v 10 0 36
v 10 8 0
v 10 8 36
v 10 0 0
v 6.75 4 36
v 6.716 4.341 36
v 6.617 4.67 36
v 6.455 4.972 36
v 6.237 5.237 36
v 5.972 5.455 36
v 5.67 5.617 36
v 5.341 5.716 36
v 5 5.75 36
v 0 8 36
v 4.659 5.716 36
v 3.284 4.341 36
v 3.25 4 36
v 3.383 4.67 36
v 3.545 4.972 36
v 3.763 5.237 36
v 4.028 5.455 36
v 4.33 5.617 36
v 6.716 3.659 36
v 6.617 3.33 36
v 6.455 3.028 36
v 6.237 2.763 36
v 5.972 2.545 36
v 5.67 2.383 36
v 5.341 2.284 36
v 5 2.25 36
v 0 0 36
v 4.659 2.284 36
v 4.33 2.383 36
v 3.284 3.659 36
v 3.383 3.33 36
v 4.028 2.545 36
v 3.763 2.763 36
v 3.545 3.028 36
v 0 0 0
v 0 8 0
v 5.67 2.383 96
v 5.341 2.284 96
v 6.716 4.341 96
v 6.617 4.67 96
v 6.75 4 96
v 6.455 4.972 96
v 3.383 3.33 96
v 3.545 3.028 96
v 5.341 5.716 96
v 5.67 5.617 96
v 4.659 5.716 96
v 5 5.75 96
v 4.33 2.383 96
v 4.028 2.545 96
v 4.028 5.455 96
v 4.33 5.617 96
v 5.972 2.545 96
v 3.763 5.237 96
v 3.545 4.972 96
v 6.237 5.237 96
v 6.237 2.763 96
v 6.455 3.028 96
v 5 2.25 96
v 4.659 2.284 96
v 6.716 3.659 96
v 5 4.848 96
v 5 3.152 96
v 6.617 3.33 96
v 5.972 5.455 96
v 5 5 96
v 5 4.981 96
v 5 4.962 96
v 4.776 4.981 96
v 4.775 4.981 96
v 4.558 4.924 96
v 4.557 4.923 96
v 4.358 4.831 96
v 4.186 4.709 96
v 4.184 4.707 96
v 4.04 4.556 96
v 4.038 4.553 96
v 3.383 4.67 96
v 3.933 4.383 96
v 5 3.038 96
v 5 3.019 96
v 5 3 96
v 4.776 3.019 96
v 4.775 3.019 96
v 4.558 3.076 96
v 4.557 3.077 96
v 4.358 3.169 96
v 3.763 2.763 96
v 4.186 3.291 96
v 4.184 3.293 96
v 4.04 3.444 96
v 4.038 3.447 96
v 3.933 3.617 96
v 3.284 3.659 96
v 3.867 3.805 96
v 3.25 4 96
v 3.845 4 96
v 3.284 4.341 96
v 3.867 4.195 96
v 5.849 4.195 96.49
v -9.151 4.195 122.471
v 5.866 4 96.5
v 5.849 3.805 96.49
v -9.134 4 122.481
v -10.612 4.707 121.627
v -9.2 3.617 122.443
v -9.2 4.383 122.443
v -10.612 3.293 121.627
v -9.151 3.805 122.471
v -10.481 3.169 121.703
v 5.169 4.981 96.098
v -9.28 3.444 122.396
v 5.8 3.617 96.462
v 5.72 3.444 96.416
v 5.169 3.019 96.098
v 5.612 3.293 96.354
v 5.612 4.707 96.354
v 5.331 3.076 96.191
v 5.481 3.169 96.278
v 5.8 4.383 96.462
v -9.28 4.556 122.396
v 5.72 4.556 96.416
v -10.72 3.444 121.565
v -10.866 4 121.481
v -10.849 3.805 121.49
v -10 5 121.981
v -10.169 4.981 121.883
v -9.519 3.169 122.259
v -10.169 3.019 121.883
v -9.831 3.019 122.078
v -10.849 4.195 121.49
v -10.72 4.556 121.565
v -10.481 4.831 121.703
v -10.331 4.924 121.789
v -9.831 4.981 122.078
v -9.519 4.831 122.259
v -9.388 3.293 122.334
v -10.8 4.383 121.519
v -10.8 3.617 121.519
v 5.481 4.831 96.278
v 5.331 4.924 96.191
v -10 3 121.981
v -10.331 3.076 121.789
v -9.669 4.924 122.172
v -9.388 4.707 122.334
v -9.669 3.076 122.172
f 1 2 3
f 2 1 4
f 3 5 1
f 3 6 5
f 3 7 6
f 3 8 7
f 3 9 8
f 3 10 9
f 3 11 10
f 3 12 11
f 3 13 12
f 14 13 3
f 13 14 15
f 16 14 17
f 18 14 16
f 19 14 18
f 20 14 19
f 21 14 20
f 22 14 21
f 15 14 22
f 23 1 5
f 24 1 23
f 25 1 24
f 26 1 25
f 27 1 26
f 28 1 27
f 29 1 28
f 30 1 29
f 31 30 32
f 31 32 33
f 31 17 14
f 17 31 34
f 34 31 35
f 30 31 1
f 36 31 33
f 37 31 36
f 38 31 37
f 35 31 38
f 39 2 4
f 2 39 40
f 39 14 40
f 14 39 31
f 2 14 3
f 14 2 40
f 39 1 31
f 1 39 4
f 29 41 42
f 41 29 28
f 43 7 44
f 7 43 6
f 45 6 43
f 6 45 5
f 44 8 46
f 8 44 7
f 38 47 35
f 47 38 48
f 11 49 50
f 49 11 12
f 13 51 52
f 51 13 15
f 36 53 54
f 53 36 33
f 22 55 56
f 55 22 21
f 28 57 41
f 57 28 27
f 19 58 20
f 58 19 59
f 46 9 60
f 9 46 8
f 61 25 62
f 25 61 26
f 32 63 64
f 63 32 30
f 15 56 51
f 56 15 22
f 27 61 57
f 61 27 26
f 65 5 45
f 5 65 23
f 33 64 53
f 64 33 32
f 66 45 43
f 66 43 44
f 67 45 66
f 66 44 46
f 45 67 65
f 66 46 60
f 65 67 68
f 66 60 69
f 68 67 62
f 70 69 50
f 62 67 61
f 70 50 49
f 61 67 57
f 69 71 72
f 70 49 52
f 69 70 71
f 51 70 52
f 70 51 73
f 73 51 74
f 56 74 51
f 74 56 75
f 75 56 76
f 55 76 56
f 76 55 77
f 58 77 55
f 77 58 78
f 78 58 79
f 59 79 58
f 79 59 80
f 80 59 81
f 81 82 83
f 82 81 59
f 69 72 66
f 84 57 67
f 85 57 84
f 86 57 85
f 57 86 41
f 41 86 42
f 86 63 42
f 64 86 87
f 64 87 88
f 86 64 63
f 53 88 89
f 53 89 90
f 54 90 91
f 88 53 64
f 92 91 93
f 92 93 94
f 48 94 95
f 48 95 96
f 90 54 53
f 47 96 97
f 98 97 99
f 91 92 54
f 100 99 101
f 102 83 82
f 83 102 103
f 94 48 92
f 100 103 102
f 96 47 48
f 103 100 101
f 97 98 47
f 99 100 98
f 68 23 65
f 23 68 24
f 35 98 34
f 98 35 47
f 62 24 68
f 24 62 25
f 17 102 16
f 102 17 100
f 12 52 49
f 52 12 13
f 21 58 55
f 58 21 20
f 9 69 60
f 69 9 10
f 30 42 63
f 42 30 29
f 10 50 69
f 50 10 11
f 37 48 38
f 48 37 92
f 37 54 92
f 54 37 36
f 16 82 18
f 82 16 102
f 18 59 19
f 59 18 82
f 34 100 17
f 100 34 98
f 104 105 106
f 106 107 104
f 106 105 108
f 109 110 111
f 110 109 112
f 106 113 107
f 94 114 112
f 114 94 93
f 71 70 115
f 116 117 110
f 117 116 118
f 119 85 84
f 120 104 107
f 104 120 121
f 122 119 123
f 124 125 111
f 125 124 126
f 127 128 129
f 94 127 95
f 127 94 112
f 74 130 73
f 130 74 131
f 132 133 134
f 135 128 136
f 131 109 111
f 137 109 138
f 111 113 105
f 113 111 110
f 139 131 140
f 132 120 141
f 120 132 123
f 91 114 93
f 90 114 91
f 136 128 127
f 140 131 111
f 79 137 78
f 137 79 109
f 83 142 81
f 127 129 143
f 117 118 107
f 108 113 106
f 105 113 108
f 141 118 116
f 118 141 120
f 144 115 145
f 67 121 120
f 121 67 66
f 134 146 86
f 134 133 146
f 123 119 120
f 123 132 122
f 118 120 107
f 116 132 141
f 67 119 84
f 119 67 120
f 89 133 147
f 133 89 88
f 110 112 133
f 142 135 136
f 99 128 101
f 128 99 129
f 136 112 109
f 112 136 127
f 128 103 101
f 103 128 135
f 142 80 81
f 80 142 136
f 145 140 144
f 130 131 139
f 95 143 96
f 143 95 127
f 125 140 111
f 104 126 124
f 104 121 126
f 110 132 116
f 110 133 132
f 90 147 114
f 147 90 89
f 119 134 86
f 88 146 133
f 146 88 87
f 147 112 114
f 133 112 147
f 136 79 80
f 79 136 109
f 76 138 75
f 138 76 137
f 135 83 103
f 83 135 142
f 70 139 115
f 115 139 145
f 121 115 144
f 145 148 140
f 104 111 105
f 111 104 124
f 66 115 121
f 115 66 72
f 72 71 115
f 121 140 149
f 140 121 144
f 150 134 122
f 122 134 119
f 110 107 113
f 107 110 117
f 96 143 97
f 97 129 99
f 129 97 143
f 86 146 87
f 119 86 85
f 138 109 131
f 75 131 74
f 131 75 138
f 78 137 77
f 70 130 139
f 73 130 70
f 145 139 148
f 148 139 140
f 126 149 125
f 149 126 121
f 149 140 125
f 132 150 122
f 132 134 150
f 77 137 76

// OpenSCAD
// Floor harp parametric placeholder geometry.
// NOT fabrication authority. Scaffold for future CAD authoring.
// Dimensions from floor-harp-design-table.xlsx and string-schedule.csv.
// Authority: pending_measurement — do not use for fabrication without
// review against a measured template.

column_height_in     = 60.0;  // approximate concert pedal harp column
soundbox_length_in   = 36.0;
soundbox_width_in    = 10.0;
soundbox_depth_in    = 8.0;
neck_height_in       = 30.0;
string_count         = 36;    // small floor harp; concert = 47
longest_string_in    = 42.0;
shortest_string_in   = 4.5;
bridge_pin_spacing_in = 0.5;

module soundbox() {
  cube([soundbox_width_in, soundbox_depth_in, soundbox_length_in]);
}

module column() {
  translate([soundbox_width_in / 2, soundbox_depth_in / 2, soundbox_length_in])
    cylinder(h=column_height_in, d=3.5, $fn=32);
}

module neck_curve() {
  translate([soundbox_width_in / 2, soundbox_depth_in / 2, soundbox_length_in + column_height_in])
    rotate([0, -30, 0])
      cylinder(h=neck_height_in, d=2.0, $fn=32);
}

soundbox();
column();
neck_curve();
